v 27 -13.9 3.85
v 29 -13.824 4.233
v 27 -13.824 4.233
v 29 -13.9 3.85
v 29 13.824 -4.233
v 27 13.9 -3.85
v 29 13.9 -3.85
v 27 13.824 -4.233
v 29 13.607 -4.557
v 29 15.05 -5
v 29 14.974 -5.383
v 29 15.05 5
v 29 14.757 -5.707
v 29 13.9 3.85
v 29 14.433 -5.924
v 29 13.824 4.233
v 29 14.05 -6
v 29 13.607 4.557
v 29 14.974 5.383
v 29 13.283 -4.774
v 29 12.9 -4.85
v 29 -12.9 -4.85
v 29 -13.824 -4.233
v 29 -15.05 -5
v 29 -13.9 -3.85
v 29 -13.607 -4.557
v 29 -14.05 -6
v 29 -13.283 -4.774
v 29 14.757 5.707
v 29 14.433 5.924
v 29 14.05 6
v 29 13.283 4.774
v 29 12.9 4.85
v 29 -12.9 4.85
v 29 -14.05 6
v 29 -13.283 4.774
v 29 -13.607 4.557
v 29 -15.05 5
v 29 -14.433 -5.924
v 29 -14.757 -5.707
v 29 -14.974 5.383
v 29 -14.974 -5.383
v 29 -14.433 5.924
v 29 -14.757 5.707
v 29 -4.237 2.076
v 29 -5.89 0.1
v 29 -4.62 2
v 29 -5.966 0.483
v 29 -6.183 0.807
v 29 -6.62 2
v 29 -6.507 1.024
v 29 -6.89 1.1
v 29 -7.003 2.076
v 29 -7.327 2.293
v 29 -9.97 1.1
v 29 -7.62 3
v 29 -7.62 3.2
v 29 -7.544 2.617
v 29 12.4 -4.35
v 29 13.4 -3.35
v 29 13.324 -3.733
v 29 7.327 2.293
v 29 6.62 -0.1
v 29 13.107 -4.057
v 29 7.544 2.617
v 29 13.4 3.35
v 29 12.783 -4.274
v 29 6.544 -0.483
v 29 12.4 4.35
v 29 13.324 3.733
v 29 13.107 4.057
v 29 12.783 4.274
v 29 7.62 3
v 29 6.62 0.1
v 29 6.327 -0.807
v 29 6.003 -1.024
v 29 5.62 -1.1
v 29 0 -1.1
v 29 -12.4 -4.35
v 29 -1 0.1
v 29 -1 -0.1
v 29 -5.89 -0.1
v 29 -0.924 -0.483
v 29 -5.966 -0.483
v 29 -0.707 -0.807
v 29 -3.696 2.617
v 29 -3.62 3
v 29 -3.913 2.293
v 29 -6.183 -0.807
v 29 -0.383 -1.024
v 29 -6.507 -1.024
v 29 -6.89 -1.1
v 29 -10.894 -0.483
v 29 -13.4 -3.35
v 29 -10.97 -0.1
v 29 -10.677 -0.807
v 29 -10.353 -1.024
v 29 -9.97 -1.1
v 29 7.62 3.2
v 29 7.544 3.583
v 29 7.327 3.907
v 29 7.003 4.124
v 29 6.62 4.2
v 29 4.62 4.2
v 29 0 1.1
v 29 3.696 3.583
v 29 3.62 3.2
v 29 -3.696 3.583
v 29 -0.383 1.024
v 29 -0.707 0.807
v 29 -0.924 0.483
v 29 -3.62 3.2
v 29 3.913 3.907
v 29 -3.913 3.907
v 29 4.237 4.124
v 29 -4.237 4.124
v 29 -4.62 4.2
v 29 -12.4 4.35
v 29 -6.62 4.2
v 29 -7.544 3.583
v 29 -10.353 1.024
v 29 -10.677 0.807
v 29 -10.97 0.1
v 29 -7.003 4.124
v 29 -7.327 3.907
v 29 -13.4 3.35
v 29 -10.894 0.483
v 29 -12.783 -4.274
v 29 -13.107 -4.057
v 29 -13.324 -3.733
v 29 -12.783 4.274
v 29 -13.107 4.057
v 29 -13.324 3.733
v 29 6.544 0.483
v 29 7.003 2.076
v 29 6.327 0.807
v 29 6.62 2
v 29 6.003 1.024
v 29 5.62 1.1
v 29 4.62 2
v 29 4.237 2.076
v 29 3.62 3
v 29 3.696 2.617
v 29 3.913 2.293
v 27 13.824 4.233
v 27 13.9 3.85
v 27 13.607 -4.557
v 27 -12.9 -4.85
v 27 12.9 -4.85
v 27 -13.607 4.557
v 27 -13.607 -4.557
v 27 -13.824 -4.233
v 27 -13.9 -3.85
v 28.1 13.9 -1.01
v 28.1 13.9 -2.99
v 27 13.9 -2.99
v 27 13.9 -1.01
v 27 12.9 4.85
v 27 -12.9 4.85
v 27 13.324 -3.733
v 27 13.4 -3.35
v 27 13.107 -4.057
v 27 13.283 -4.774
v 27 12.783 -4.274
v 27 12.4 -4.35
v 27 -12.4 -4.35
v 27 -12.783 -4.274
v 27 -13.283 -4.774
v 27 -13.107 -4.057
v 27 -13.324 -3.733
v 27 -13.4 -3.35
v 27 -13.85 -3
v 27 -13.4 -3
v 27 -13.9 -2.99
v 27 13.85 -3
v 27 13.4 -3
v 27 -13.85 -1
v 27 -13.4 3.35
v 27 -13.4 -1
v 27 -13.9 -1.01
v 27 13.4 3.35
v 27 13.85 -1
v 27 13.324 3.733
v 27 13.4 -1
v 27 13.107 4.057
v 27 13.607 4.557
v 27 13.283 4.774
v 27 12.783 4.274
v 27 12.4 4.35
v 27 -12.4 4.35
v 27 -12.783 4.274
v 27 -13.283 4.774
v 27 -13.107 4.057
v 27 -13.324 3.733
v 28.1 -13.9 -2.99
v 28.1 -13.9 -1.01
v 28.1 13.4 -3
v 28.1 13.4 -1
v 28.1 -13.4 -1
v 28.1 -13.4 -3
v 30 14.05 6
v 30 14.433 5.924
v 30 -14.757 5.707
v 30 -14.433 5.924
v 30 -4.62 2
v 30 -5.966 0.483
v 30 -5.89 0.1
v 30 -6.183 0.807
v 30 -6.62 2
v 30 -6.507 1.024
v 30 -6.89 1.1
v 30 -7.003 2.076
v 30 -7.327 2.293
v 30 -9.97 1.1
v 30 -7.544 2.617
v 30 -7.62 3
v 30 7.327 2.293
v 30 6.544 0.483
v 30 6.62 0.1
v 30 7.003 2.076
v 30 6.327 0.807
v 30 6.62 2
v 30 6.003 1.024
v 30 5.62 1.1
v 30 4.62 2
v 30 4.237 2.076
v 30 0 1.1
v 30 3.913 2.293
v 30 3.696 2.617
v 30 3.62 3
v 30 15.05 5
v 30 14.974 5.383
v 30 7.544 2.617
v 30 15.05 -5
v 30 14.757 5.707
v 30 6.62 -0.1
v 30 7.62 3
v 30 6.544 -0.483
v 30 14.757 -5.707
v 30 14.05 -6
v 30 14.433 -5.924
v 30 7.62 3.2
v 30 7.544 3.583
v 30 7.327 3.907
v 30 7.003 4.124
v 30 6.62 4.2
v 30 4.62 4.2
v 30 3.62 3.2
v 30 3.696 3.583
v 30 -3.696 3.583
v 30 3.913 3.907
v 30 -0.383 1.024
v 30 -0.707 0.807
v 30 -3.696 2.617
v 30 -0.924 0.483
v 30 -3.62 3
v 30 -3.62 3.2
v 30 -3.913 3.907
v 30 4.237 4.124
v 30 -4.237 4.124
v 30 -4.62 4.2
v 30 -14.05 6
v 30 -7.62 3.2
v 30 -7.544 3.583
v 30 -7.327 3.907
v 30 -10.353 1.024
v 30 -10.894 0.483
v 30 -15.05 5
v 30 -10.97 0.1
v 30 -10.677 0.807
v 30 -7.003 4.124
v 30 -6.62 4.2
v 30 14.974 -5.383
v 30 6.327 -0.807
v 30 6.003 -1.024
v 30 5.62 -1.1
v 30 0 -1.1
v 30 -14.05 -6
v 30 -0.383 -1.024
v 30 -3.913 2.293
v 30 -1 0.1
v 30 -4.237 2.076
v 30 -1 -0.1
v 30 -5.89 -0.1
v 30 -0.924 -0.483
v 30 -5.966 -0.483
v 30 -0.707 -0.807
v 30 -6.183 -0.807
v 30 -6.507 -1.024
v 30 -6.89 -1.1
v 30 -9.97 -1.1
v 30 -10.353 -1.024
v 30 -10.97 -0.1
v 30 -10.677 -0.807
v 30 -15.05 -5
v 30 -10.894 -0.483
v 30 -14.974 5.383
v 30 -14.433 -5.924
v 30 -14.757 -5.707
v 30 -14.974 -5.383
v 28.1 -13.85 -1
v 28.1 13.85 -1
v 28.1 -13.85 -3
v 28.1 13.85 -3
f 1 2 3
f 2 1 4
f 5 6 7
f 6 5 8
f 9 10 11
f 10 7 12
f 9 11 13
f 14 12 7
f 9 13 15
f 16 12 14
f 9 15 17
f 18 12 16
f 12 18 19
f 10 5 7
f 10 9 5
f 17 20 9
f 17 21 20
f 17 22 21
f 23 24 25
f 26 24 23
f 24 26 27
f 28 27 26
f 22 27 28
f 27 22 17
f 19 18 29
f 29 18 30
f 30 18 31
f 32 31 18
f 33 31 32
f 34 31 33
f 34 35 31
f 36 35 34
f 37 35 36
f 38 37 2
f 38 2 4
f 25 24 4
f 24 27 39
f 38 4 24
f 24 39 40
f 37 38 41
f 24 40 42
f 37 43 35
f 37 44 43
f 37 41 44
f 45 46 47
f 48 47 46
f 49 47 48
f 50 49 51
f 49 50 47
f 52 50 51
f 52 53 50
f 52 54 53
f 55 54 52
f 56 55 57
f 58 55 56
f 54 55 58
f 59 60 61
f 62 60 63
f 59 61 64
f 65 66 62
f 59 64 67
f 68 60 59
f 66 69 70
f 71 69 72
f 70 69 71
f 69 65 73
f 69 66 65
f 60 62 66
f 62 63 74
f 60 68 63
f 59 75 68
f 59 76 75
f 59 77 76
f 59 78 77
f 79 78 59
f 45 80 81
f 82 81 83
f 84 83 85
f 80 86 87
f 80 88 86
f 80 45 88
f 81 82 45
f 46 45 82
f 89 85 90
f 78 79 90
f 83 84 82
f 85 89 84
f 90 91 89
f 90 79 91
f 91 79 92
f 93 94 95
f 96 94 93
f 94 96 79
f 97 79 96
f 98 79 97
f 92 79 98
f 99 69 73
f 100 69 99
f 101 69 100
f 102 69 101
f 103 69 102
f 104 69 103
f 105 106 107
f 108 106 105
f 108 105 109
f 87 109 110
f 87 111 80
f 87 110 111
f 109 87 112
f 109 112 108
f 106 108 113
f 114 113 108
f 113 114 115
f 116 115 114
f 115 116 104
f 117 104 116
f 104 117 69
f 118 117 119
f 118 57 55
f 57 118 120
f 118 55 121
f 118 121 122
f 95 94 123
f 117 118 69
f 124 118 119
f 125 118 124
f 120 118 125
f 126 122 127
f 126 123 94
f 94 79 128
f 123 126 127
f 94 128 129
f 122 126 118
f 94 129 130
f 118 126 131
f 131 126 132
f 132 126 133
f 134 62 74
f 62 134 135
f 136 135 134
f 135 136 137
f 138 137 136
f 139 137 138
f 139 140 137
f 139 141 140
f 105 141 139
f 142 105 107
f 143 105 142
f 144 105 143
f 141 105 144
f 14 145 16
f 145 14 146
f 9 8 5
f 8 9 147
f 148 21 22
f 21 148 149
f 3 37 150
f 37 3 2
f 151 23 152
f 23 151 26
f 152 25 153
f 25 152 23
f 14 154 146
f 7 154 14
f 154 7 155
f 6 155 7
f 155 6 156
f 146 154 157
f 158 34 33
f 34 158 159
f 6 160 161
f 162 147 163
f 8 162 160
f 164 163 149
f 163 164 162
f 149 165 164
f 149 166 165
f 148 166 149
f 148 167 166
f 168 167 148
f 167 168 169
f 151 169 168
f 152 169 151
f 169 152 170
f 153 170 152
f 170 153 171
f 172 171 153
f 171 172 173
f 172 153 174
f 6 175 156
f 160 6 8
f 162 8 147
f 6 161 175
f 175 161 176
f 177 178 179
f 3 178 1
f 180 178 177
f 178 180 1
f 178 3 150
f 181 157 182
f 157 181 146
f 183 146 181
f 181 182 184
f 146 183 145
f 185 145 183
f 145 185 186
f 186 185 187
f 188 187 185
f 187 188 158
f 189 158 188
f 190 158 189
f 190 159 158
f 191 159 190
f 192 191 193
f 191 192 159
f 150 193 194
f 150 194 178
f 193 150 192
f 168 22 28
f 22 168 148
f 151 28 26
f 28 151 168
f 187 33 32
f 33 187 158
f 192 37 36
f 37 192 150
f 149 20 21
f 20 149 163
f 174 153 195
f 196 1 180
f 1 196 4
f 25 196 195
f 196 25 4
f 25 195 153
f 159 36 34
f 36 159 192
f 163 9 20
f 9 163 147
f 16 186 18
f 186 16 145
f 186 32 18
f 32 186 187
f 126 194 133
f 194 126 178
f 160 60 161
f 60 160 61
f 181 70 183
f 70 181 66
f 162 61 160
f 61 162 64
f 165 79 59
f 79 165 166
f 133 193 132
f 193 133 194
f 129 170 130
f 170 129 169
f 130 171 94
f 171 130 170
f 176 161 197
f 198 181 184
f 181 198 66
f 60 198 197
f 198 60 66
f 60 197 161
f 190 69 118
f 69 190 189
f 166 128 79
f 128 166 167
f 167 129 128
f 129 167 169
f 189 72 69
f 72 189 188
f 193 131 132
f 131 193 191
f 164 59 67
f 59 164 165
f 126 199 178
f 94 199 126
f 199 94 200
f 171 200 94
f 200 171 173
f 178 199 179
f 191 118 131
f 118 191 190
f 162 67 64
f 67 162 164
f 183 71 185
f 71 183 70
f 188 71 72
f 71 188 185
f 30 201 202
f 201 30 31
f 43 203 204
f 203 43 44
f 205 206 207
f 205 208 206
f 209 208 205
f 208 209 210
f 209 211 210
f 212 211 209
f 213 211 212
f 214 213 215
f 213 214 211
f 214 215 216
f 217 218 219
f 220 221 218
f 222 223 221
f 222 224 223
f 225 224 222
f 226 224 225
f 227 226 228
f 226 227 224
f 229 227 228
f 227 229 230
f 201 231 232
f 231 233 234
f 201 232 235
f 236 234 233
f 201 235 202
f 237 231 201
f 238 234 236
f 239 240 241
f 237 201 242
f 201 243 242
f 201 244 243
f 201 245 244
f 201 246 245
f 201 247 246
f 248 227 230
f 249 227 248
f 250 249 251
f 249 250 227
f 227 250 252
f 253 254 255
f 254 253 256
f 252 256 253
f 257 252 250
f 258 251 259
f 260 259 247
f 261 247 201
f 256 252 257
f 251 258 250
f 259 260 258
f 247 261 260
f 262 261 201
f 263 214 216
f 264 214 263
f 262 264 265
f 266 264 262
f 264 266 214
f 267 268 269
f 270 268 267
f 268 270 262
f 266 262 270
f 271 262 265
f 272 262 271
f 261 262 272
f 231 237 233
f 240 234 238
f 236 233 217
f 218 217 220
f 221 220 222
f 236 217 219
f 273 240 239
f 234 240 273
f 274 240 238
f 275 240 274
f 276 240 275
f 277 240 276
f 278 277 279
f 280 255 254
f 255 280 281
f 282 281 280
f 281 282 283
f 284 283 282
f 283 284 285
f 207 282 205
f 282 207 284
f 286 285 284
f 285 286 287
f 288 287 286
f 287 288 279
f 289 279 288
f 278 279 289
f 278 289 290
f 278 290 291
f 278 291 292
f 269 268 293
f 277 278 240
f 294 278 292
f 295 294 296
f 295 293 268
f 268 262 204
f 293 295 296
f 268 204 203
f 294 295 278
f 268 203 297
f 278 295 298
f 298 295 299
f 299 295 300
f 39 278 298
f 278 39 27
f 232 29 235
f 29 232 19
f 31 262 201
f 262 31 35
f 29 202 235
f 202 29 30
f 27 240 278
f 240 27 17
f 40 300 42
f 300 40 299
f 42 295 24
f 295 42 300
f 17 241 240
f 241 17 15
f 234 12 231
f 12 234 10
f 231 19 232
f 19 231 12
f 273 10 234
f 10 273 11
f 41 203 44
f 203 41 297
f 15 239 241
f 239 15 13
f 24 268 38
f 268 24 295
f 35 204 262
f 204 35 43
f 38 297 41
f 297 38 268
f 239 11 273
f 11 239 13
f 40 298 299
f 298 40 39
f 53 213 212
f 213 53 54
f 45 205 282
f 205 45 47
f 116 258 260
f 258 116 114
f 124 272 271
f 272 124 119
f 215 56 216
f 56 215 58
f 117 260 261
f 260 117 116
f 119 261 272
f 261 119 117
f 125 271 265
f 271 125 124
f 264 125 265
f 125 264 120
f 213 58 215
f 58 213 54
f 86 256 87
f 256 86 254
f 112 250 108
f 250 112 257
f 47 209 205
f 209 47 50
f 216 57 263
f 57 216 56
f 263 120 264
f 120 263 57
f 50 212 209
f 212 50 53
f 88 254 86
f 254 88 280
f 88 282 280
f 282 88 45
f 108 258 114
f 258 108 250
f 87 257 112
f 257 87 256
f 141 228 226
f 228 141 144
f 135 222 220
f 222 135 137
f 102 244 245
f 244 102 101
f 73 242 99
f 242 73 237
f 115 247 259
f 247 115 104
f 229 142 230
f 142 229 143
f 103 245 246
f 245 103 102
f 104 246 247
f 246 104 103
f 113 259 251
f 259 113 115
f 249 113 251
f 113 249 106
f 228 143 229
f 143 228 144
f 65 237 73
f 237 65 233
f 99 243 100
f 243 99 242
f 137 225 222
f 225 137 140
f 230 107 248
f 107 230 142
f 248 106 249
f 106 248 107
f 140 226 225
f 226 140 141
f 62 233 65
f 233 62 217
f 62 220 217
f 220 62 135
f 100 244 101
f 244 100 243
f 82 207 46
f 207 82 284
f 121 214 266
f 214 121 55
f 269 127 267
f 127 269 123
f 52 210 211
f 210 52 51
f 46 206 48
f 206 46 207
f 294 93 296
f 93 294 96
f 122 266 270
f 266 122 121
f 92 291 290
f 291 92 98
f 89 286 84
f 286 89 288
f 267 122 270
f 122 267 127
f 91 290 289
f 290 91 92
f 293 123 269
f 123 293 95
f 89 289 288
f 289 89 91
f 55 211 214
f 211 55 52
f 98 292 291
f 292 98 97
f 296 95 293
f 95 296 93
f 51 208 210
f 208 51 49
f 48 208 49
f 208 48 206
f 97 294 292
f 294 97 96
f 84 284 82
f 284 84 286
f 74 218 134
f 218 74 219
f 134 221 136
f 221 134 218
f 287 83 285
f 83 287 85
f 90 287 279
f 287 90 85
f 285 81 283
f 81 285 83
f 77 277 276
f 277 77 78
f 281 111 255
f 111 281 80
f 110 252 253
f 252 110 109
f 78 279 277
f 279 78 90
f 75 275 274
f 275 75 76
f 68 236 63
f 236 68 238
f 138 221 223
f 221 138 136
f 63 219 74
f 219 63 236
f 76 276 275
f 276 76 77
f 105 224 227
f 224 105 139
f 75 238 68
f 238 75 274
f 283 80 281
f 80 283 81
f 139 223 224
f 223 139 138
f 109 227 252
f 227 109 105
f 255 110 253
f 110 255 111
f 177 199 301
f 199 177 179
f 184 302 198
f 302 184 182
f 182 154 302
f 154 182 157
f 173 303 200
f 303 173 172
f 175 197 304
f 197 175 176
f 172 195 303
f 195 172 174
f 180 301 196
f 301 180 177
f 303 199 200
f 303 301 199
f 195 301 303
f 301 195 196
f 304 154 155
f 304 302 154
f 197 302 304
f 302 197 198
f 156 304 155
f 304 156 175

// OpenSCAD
//
// Adafruit MAX98306 3.7W Stereo Amplifier Board Enclosure
//
// by Yasuhiro Wabiko
//
// This work is licensed under a Creative Commons Attribution 4.0 International License.
// https://creativecommons.org/licenses/by/4.0/
//

use <prim.scad>

// inner size of the box.
// typically, (x,y) = board size, z depends on how much space you need for cabling.
//
size_x = 24+0.1;
size_y = 28+0.1;
size_z = 10;

// holder dimensions
holder_thick = 1; // thickness
holder_r     = 1; // radius in minkowski transform
shell_thick = 1; // thickness

// board parameters
board_thick      = 2.0;    // board thickness, typically 2mm
arm_thick        = 1.5;    // arm thickness (overhang)
arm_up_z         = 2;      // arm upper part height (in z-axis)
arm_low_z        = 2;      // arm upper part height (in z-axis)
arm_center_thick = 0.6;
arm_center_up_y  = size_y; // arm (center) upper part width
arm_center_low_y = size_y; // arm (center) lower part width
arm_left_up_x    = size_x; // arm (left) upper part height
arm_left_low_x   = size_x; // arm (left) lower part height
arm_right_up_x   = 6;      // arm (right) upper part height
arm_right_low_x  = size_x; // arm (right) lower part height
arm_r            = 0.2;    // radius in minkowski transform
arm_z            = arm_low_z + board_thick + arm_up_z;

// lid dimensions
lid_outer_x = 1;
lid_inner_x = 2;

// misc design parameters
spfn_small  = 8;
spfn_medium = 16;
spfn_large  = 64;
lid_inner_thick = 2;

// internal parameters
WELDING = 0.1;
WELDING_SMALL = 0.3;
SHELL_LID_DIST = 10; // distance between shell and lid when print_ready_layout


// render target; this is meant to be overriden by Makefile
TARGET="compo_lid_test";

//
// top level logic
//
max98306_main();

module max98306_main(target=TARGET){
    
    if (target == "default") {
        max98306(with_vent=1, with_cabling=0, with_holder=1, with_print=1);
    }

    if (target == "novent") {
        max98306(with_vent=0, with_holder=1, with_lid=1, with_print=1);
    }

    if (target == "unit_test") {
        max98306_unit(ox=40, with_cabling=1, with_vent=1, with_holder=0, with_lid=0, with_cut=0, with_support=1);
    }

    if (target == "unit_lid_test") {
        max98306_unit(ox=40, with_cabling=1, with_vent=1, with_holder=0, with_lid=1, with_body=0, with_cut=0, with_support=1);
    }

    if (target == "compo_test") {
        max98306_unit(ox=40, oy=36, oz=36, dz=8, with_cabling=1, with_vent=1, with_holder=1, with_shell=1, with_lid=1, with_cut=0, with_support=0);
    }

    if (target == "compo_body_test") {
        max98306_unit(ox=40, oy=36, oz=36, dz=8, with_cabling=1, with_vent=1, with_holder=1, with_shell=1, with_lid=0, with_cut=0, with_support=0);
    }

    if (target == "compo_lid_test") {
        max98306_unit(ox=40, oy=36, oz=36, dz=8, with_cabling=1, with_vent=1, with_holder=0, with_shell=0, with_lid=1, with_body=0, with_cut=0, with_support=0);
    }

}


// -------------------------
// Public Modules
// -------------------------

// [Public]
// Minimum size enclosure.
//
// with_vent = { 1: with ventilation slits, 0: without ventilation slits }
// with_lid  = { 1: render the lid, 0: does not render the lid }
// with_cabling = { 1: render a big openings on the enclosure for easier cabling, 0: without such openings }
// with_holder = { 1: render the holder (minimum enclosure that matches the board size). 0: does not render the holder.}
// with_shell =  { 1: render the shell (outermost enclosure that matches the requested dimension). 0: does not render the shell.}
// with_print = { 1: print layout (models are rotated to be printable), 0: edit layout (no rotation) }
// with_open_roof = { 1: make a big opening on the 'roof' part (for debugging), 0: do not do that }
module max98306(with_vent=1, with_lid=1, with_cabling=0, with_holder=1, with_shell=0, with_print=0, with_open_roof=0){

    if (with_print) {
        rotate([0,-90,0])
            translate([size_x/2+holder_thick+lid_inner_x/2, 0, 0])
            max98306_body(with_vent=with_vent, with_lid=with_lid, with_cabling=with_cabling, with_holder=with_holder, with_open_roof=with_open_roof);
        if (with_lid) {
            translate([size_z+holder_thick*2+SHELL_LID_DIST,0,0])
                rotate([0,90,0])
                max98306_lid(sx=size_x, sy=size_y, sz=size_z, wr=holder_r, wt=holder_thick, lox=lid_outer_x, lix=lid_inner_x,
                             fns=spfn_small, fnm=spfn_medium, fnl=spfn_large);
        }
    } else {
        // debug
        translate([0, 0, 0]) {
            // debug
            difference() {
                union() {
                    translate([0, 0, 0])
                        max98306_body(with_vent=with_vent, with_lid=with_lid, with_cabling=with_cabling, with_holder=with_holder, with_open_roof=with_open_roof);
                    if (with_lid) {
                        max98306_lid(sx=size_x, sy=size_y, sz=size_z, wr=holder_r, wt=holder_thick, lox=lid_outer_x, lix=lid_inner_x,
                                     fns=spfn_small, fnm=spfn_medium, fnl=spfn_large);
                    }
                }
                // debug
                translate([-size_x/2, size_y/2+holder_thick/2, 0]) {
                    //#cube([size_x*4, holder_thick, arm_z], center=true);
                }
            }
        }
    }
}

// [Public]
// Variable size enclosure(in x-axis only). Typically to be embededd in another project.
// 
// ox, oy, oz = dimension (this has to be equals to or larger than (size_x, size_y, size_z).
//   - ox is used when with_support=1.
//   - oy and oz are used only when with_shell=1.
// with_vent = { 1: with ventilation slits, 0: without ventilation slits }
// with_lid  = { 1: render the lid, 0: does not render the lid }
// with_cabling = { 1: render a big openings on the enclosure for easier cabling, 0: without such openings }
// with_holder = { 1: render the shell (outermost enclosure that matches the requested dimension). 0: does not render the shell.}
// with_shell =  { 1: render the shell (outermost enclosure that matches the requested dimension). 0: does not render the shell.}
// with_print = { 1: print layout (models are rotated to be printable), 0: edit layout (no rotation) }
// with_open_roof = { 1: make a big opening on the 'roof' part (for debugging), 0: do not do that }
module max98306_unit(ox=0, oy=0, oz=0, dz=0, with_vent=0, with_lid=1, with_body=1, with_cabling=0, with_holder=1, with_shell=0, with_support=1, with_arm=1, with_open_roof=0, with_cut=0) {
    bx = size_x + with_holder*holder_thick + lid_inner_x; // body size
    sx = ox - bx;
    dtx = (1-with_support)*(sx-holder_thick/2); // when no support, align the holder to the front.
    echo (bx=bx);
//    translate([0,-size_y/2+arm_thick,-1-WELDING]) { // debug
    translate([0,0,0]) {
//        rotate([0,0,0]) 
        rotate([0,0,180]) 
        {
            if (with_shell) {
                max98306_shell(ox=ox, oy=oy, oz=oz, st=shell_thick, with_vent=with_vent, with_cabling=with_cabling);
            }

            if (with_body) {
                translate([-dtx, 0, dz]) { // X-axis: when no support, align the holder to the front. Z-axis: requested by the caller.
                    max98306_unit_with_support(ox=ox, sh=sx, with_vent=with_vent, with_cabling=with_cabling, with_holder=with_holder, with_support=with_support, with_arm=with_arm, with_open_roof=with_open_roof, with_cut=with_cut);
                }
            }
            if (with_lid) {
                translate([-ox/2-size_z/2-5,0,0]) {
                    max98306_unit_lid_only();
                }
            }

        }
    }
}
    
module max98306_shell(ox, oy, oz, st, with_vent=1, with_cabling=1) {
    shell_thick = 1;
    difference() {
        prim_round_xplate0(ox, oy, oz, 1, 32);
        //translate([0,0,0]) { // debug
        translate([shell_thick,0,0]) {
            prim_round_xplate0(ox+WELDING, oy-shell_thick, oz-shell_thick, 1, 32);
        }
        max98306_shell_negative_volume(ox, oy, oz, shell_thick, with_vent, with_cabling);
    }
}

// [Public]
// Lid
module max98306_unit_lid_only() {
    rotate([0,0,180]) {
        max98306_lid(sx=size_x, sy=size_y, sz=size_z, wr=holder_r, wt=holder_thick, lox=lid_outer_x, lix=lid_inner_x,
                     fns=spfn_small, fnm=spfn_medium, fnl=spfn_large);
    }
}

// [Public]
// Negative volume of lid that can be shared with the outer model (useful when you are embedding this model in another project).
module max98306_unit_lid_negative_voume() {
    rotate([0,0,180]) {
        translate([-lid_outer_x, 0, 0]) {
            translate([lid_outer_x/2,0,0]) {// centering to match with positive volume
                #max98306_lid_negative_volume(size_x, size_y, size_z, holder_r, holder_thick,
                                             spfn_small, spfn_medium, spfn_large);
            }
        }
    }
}

// -------------------------
// Private Modules
// -------------------------

module max98306_shell_negative_volume(sx, sy, sz, st, with_vent, with_cabling) {
    with_cabling_type0 = 0;
    // vent top
    if (with_cabling) {
        translate([0,0,sz/2]) {
            for (iy=[-2,-1,0,1,2]) {
                translate([0,iy*5.9,0]) {
                    if (with_cabling_type0) { 
                        prim_round_zplate0(sx*0.6, 3, st*3, 1, 16);
                    } else {
                        for (ix=[-2,-1,0,1,2]) {
                            translate([ix*5.9, 0, 0]) {
                                cylinder(h=st*4, r=1.6, $fn=16, center=true);
                            }
                        }
                    }
                }
            }
        }
    }

    // vent side
    if (!with_cabling) {
        if (with_vent) {
            translate([0,0,0]) {
                for (i=[-2,-1,0,1,2,3]) {
                    translate([0,0,i*5-2]) {
                        prim_round_yplate0(sx*0.6, sy*2, 2, 1, 16);
                    }
                }
            }
        }
    }
}

module max98306_body(with_vent=0, with_lid=0, with_cabling=0, with_holder=0, with_arm=1, with_open_roof=0){
    dx = (with_cabling)*lid_inner_x;
    union() {
        difference() {
            union() {
                cube([0,0,0]); // dummy cube to make difference() work regardless of conditions
                if (with_holder){
                    max98306_holder(sx=size_x, sy=size_y, sz=size_z, wr=holder_r, wt=holder_thick,
                                   fns=spfn_small, fnm=spfn_medium, fnl=spfn_large, with_open_roof=with_open_roof);
                }
                // side support. (if with_holder=1, it is embedded inside shell, so invisible.)
                for (i=[-1,1]) {
                    //translate([-size_x/2-holder_thick*2+WELDING_SMALL+arm_left_up_x/2, (-size_y/2-holder_thick+WELDING_SMALL)*i, -board_thick]) {
                    //cube([arm_left_up_x, WELDING_SMALL*2, arm_z], center=true);
                    //}
                }
            }
            union() {
                if (with_holder) {
                    max98306_holder_negative_volume(sx=size_x, sy=size_y, sz=size_z, wr=holder_r, wt=holder_thick,
                                                   fns=spfn_small, fnm=spfn_medium, fnl=spfn_large, with_vent=with_vent, with_cabling=with_cabling, with_holder=with_holder);
                }
            }
        }

        if (with_arm) {
            translate([0,0,-holder_thick]){
                max98306_holder_arm(size_x, size_y, size_z, holder_r, holder_thick,
                                   spfn_small, spfn_medium, spfn_large);
            }
        }
    }
}


module max98306_unit_with_support(ox=size_x, sh=0, with_vent=0, with_cabling=0, with_holder=0, with_support=1, with_arm=1, with_open_roof=0, with_cut=0) {
    bx = size_x + with_holder*holder_thick + lid_inner_x; // body size
    // when (!with_cut), match height with shell dimension
    dz = holder_thick*2*(1-with_cut);
    dx = (1-with_holder)*holder_thick;
    esh = sh; // effective support height
    echo(esh=esh);
    echo(with_support=with_support);
    // centering
//     translate([ox/2,0,0])
     translate([bx/2+esh-(bx+esh)/2,0,0]) // centering
//     translate([-lid_inner_x+(bx+esh)/2,0,size_z/2+holder_thick])
    {
        difference() { // cut unnecessary welding at the top and bottom
            union() {
                if (with_support) {
                    // support structure
                    difference(){
                        translate([-bx/2-esh/2, 0, 0]) {
                            prim_round_xplate0(esh, size_y+holder_thick*2, size_z+holder_thick*2, 1, spfn_medium);
                        }
                        translate([-esh-size_x/2-WELDING_SMALL, 0, 0]) {
                            //#prim_round_xplate0(size_x+WELDING_SMALL*2, size_y, size_z+WELDING, 0.1, spfn_medium);
                        }
                    }
                }

                translate([0,0,0]) {
                    cube([0,0,0],center=true);// dummy
                    max98306_body(with_vent=with_vent, with_cabling=with_cabling, with_holder=with_holder, with_arm=with_arm, with_open_roof=with_open_roof);
                    }

            }
            union() { // cut unnecessary parts at the top and bottom
                cube([0,0,0]); // dummy
                if (with_cut) {
                    // bottom
                    translate([-(size_x+esh)/2, 0, -arm_z-holder_thick*2]) {
                        #cube([size_x+esh, size_y+holder_thick*4, arm_z], center=true);
                    }
                    // top
                    translate([-(size_x+esh)/2, 0, arm_z-holder_thick*2]) {
                        #cube([size_x+esh, size_y+holder_thick*4, arm_z], center=true);
                    }
                }
            }
        }
    }
}



//
// (sx,sy,sz) = dimension of stuffing
//
// centered at the center of stuffing (excluding lid_inner_x)
//
module max98306_holder(sx, sy, sz, wr, wt,
                      fns, fnm, fnl, with_open_roof=0){

    // requested dimensions
    ox = sx+wt+lid_inner_x;
    oy = sy+wt*2;
    oz = sz+wt*2;
    
    translate([ox/2-sx/2-wt-lid_inner_x/2, oy/2-sy/2-wt, oz/2-sz/2-wt]) {
        difference(){
            // shell outer frame
            translate([0,0,0]){
                prim_round_xplate0(ox, oy, oz, wr, fnm);
            }
            // shell space for stuffing
            translate([wt, 0, 0]) {
                #prim_round_xplate0(sx+lid_inner_x+wt, sy, sz+10*with_open_roof, wr, fnm);
            }
        }
    }

}

module max98306_holder_arm(sx, sy, sz, wr, wt,
                      fns, fnm, fnl){
    // requested dimensions
    ox = sx+wt+lid_inner_x;
    oy = sy+wt*2;
    oz = sz+wt*2;

    with_center = 1;
    with_right = 1;
    with_left = 1;
    
    for (i=[0,1]){ // i = { 0:arm lower, 1:arm upper }
        dz = (arm_low_z/2+board_thick+arm_up_z/2+WELDING)*i;
        rx = [arm_right_low_x, arm_right_up_x][i];
        lx = [arm_left_low_x, arm_left_up_x][i];
        cy = [arm_center_low_y, arm_center_up_y][i];
        translate([-wt*2, 0, -sz/2+wt+arm_low_z/2-WELDING/2+dz]){

            // center
            if (with_center) {
                y0 = -size_y/2+cy/2;
                translate([-sx/2+arm_center_thick/2-WELDING+wt, y0, 0]) {
                    prim_round_yplate0(arm_center_thick+WELDING, arm_center_low_y+WELDING*2, arm_low_z+WELDING, 0.1, fnm);
                }
            }

            // left
            if (with_left) {
                x0 = -size_x/2+lx/2+wt;
                translate([x0-WELDING/2, -sy/2+arm_thick/2-WELDING/2, 0]) {
                    prim_round_xplate0(lx+WELDING, arm_thick+WELDING, arm_low_z+WELDING, arm_r, fnm);
                }
            }

            // right
            if (with_right) {
                x0 = -size_x/2+rx/2+wt;
                translate([x0-WELDING/2, sy/2-arm_thick/2+WELDING/2, 0]) {
                    prim_round_xplate0(rx+WELDING, arm_thick+WELDING, arm_low_z+WELDING, arm_r, fnm);
                }
            }
        }
    }
}



module max98306_holder_negative_volume(sx, sy, sz, wr, wt,
                                      fns, fnm, fnl, with_vent=0, with_cabling=0, with_holder=0){
    with_cabling_top = with_cabling;
    with_cabling_bottom = 0;

    // cable hole at the top of shell
    if (with_cabling_top) {
        translate([0, 0, sz/2])
            prim_round_zplate0(sx*2, sy*2, sz*0.5, 1, fnm);
    }

    // cable hole at the bottom of shell
    if (with_cabling_bottom) {
        for (i=[-2:1:2]) {
            translate([0, i*2.54, 0])
                prim_round_zplate0(sx*0.9, 2.0, sz+wt*2+WELDING, 1, fnm);
        }
    }

    if (with_vent){
        // top/bottom vent
        for (i=[-2:1:2]) {
            translate([0, i*3.5, 0])
                #prim_round_zplate0(sx*0.8, 2, sz+wt+2, 1, fnm);
                }

        // side vent
//        for (i=[0.5]) {
//            translate([0, 0, i*4])
//                #prim_round_yplate0(sx*0.8, sy+wt+2, 2, 1, fnm);
//        }

        // front vent
        vz = sz-arm_z;
        for (i=[0.5]) {
            translate([0, 0, -sz/2+arm_z+vz/2])
                #prim_round_xplate0(sx+wt*2+2, sy*0.8, vz, 1, fnm);
        }
    }
    
    // front
    if (with_holder) {
        translate([-sx/2-wt, 0, -sz/2+arm_low_z+board_thick/2]) {
            //prim_round_xplate0(wt*2+4, 16, board_thick, 0.1, fnm);
        }
    }
}


module max98306_lid(sx, sy, sz, wr, wt, lox, lix,
                      fns, fnm, fnl){
    translate([-lox, 0, 0])
    difference(){
        max98306_lid_body(sx, sy, sz, wr, wt,
                          fns, fnm, fnl);
        union() {
            translate([lid_outer_x/2,0,0]) { // centering to match with positive volume
                max98306_lid_negative_volume(sx=sx, sy=sy, sz=sz, wr=wr, wt=wt, lox=lox,
                                             fns=fns, fnm=fnm, fnl=fnl);
                max98306_lid_negative_volume_private(sx=sx, sy=sy, sz=sz, wr=wr, wt=wt, lox=lox, lix=lix,
                                                     fns=fns, fnm=fnm, fnl=fnl);
            }
        }
    }
}

module max98306_lid_body(sx, sy, sz, wr, wt,
                      fns, fnm, fnl){

    // inner
    translate([-lid_inner_x/2,0,0])
    difference(){
        prim_round_xplate(lid_inner_x, sy-WELDING_SMALL, sz-WELDING_SMALL, wr, fnm);
        translate([0, 0, 0])
            prim_round_xplate(lid_inner_x+WELDING*2, sy-wt-WELDING_SMALL, sz-wt-WELDING_SMALL, wr, fnm);
    }    

    // outer
    translate([lid_outer_x/2,0,0])
        prim_round_xplate(lid_outer_x, sy+wt*2, sz+wt*2, wr, fnm);

}

// shared with lid outer
module max98306_lid_negative_volume(sx, sy, sz, wr, wt, lox,
                                    fns, fnm, fnl){
    // speaker out
    for (i=[-1,1]) {
        translate([0,i*(sy*0.2),3.1]) {
            #prim_round_xplate(lox+WELDING*2, 4, 2.2, wr, fnm);
        }
    }    

    // power in 
    translate([0,-(sy*0.3),0]) {
        #prim_round_xplate(lox+WELDING*2, 2.54*2, 2.2, wr, fnm);
    }
    
    // audio in
    translate([0,+(sy*0.1),0]) {
        #prim_round_xplate(lox+WELDING*2, 2.54*3, 2.2, wr, fnm);
    }

}

// with lid inner
module max98306_lid_negative_volume_private(sx, sy, sz, wr, wt, lox, lix,
                                    fns, fnm, fnl){

    // slit to accomodate board edge
    translate([-lox-lix/2, 0, -sz/2+arm_low_z+board_thick/2]) {
        #prim_round_xplate(lox+WELDING*2, sy, 2, 0.2, fnm);
    }
        
}
